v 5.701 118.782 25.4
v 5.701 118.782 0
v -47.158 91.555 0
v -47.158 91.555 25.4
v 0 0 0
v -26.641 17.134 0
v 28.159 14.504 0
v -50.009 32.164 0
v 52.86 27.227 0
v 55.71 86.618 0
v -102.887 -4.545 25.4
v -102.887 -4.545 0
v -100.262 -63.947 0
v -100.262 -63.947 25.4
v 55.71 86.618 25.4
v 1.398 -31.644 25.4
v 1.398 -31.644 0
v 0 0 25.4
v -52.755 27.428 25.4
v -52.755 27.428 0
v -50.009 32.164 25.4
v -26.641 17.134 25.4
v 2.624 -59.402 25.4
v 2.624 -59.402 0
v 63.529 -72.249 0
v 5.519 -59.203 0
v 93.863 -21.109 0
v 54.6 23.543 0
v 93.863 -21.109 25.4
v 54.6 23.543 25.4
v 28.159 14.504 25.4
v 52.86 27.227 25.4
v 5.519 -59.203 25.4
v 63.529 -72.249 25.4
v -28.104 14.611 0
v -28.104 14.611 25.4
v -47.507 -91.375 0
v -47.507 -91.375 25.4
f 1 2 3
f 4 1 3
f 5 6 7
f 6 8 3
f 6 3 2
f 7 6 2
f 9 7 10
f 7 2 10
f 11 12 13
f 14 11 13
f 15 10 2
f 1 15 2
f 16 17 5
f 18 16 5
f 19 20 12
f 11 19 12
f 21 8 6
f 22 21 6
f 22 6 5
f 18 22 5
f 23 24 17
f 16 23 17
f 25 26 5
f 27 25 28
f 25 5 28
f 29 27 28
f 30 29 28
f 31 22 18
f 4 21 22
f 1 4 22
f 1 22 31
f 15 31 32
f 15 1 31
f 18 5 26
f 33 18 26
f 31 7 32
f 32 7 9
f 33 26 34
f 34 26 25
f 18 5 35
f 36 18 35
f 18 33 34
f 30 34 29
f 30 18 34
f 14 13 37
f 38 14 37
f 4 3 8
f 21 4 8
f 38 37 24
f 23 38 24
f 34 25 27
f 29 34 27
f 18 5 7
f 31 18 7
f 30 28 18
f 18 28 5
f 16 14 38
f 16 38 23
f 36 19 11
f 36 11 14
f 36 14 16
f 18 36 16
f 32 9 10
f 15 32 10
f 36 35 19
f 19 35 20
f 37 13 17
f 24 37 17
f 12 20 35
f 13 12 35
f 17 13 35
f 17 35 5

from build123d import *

# Parameters (mm, degrees)
F1_DEPTH = 25.4


with BuildPart() as f1:
    # F0 (on Top) → F1 (new body)
    with BuildSketch(Plane.XY):
        with BuildLine():
            ThreePointArc((-26.6405862454, 17.1343847799), (1.5185193749, 31.6386168502), (28.1591056203, 14.5042320703))
            Line((28.1591056203, 14.5042320703), (52.8595212289, 27.2269571827))
            Line((52.8595212289, 27.2269571827), (55.7100452554, 86.6181239901))
            Line((55.7100452554, 86.6181239901), (5.701048053, 118.7823336148))
            Line((5.701048053, 118.7823336148), (-47.1584731759, 91.5553764322))
            Line((-47.1584731759, 91.5553764322), (-50.0089972024, 32.1642096247))
            Line((-50.0089972024, 32.1642096247), (-26.6405862454, 17.1343847799))
        make_face()
        with BuildLine():
            Line((0, 0), (28.1591056203, 14.5042320703))
            ThreePointArc((28.1591056203, 14.5042320703), (1.5185193749, 31.6386168502), (-26.6405862454, 17.1343847799))
            Line((-26.6405862454, 17.1343847799), (0, 0))
        make_face()
    extrude(amount=F1_DEPTH)


with BuildPart() as f1b:
    # F0 (on Top) → F1, piece 2 (new body)
    with BuildSketch(Plane.XY):
        with BuildLine():
            Line((2.6241702257, -59.4015985694), (1.397937114, -31.6441740153))
            ThreePointArc((1.397937114, -31.6441740153), (-26.705690022, -17.0327360612), (-28.103627136, 14.6114379541))
            Line((-28.103627136, 14.6114379541), (-52.7553784994, 27.4282012053))
            Line((-52.7553784994, 27.4282012053), (-102.886586773, -4.5451961587))
            Line((-102.886586773, -4.5451961587), (-100.2624165472, -63.9467947281))
            Line((-100.2624165472, -63.9467947281), (-47.5070380479, -91.3749959334))
            Line((-47.5070380479, -91.3749959334), (2.6241702257, -59.4015985694))
        make_face()
        with BuildLine():
            Line((1.397937114, -31.6441740153), (0, 0))
            Line((0, 0), (-28.103627136, 14.6114379541))
            ThreePointArc((-28.103627136, 14.6114379541), (-26.705690022, -17.0327360612), (1.397937114, -31.6441740153))
        make_face()
    extrude(amount=F1_DEPTH)


with BuildPart() as f1c:
    # F0 (on Top) → F1, piece 3 (new body)
    with BuildSketch(Plane.XY):
        with BuildLine():
            ThreePointArc((29.0862627469, 12.5418219052), (31.0210930643, 6.4031056823), (31.6750371315, 0))
            ThreePointArc((31.6750371315, 0), (23.413962327, -21.3329403842), (2.9398319575, -31.5383158292))
            Line((2.9398319575, -31.5383158292), (5.5185740578, -59.202884409))
            Line((5.5185740578, -59.202884409), (63.529196227, -72.249105989))
            Line((63.529196227, -72.249105989), (93.8631583783, -21.1092299413))
            Line((93.8631583783, -21.1092299413), (54.599955832, 23.5431732167))
            Line((54.599955832, 23.5431732167), (29.0862627469, 12.5418219052))
        make_face()
        with BuildLine():
            ThreePointArc((2.9398319575, -31.5383158292), (23.413962327, -21.3329403842), (31.6750371315, 0))
            ThreePointArc((31.6750371315, 0), (31.0210930643, 6.4031056823), (29.0862627469, 12.5418219052))
            Line((29.0862627469, 12.5418219052), (0, 0))
            Line((0, 0), (2.9398319575, -31.5383158292))
        make_face()
    extrude(amount=F1_DEPTH)


solid = Compound([f1.part, f1b.part, f1c.part])
